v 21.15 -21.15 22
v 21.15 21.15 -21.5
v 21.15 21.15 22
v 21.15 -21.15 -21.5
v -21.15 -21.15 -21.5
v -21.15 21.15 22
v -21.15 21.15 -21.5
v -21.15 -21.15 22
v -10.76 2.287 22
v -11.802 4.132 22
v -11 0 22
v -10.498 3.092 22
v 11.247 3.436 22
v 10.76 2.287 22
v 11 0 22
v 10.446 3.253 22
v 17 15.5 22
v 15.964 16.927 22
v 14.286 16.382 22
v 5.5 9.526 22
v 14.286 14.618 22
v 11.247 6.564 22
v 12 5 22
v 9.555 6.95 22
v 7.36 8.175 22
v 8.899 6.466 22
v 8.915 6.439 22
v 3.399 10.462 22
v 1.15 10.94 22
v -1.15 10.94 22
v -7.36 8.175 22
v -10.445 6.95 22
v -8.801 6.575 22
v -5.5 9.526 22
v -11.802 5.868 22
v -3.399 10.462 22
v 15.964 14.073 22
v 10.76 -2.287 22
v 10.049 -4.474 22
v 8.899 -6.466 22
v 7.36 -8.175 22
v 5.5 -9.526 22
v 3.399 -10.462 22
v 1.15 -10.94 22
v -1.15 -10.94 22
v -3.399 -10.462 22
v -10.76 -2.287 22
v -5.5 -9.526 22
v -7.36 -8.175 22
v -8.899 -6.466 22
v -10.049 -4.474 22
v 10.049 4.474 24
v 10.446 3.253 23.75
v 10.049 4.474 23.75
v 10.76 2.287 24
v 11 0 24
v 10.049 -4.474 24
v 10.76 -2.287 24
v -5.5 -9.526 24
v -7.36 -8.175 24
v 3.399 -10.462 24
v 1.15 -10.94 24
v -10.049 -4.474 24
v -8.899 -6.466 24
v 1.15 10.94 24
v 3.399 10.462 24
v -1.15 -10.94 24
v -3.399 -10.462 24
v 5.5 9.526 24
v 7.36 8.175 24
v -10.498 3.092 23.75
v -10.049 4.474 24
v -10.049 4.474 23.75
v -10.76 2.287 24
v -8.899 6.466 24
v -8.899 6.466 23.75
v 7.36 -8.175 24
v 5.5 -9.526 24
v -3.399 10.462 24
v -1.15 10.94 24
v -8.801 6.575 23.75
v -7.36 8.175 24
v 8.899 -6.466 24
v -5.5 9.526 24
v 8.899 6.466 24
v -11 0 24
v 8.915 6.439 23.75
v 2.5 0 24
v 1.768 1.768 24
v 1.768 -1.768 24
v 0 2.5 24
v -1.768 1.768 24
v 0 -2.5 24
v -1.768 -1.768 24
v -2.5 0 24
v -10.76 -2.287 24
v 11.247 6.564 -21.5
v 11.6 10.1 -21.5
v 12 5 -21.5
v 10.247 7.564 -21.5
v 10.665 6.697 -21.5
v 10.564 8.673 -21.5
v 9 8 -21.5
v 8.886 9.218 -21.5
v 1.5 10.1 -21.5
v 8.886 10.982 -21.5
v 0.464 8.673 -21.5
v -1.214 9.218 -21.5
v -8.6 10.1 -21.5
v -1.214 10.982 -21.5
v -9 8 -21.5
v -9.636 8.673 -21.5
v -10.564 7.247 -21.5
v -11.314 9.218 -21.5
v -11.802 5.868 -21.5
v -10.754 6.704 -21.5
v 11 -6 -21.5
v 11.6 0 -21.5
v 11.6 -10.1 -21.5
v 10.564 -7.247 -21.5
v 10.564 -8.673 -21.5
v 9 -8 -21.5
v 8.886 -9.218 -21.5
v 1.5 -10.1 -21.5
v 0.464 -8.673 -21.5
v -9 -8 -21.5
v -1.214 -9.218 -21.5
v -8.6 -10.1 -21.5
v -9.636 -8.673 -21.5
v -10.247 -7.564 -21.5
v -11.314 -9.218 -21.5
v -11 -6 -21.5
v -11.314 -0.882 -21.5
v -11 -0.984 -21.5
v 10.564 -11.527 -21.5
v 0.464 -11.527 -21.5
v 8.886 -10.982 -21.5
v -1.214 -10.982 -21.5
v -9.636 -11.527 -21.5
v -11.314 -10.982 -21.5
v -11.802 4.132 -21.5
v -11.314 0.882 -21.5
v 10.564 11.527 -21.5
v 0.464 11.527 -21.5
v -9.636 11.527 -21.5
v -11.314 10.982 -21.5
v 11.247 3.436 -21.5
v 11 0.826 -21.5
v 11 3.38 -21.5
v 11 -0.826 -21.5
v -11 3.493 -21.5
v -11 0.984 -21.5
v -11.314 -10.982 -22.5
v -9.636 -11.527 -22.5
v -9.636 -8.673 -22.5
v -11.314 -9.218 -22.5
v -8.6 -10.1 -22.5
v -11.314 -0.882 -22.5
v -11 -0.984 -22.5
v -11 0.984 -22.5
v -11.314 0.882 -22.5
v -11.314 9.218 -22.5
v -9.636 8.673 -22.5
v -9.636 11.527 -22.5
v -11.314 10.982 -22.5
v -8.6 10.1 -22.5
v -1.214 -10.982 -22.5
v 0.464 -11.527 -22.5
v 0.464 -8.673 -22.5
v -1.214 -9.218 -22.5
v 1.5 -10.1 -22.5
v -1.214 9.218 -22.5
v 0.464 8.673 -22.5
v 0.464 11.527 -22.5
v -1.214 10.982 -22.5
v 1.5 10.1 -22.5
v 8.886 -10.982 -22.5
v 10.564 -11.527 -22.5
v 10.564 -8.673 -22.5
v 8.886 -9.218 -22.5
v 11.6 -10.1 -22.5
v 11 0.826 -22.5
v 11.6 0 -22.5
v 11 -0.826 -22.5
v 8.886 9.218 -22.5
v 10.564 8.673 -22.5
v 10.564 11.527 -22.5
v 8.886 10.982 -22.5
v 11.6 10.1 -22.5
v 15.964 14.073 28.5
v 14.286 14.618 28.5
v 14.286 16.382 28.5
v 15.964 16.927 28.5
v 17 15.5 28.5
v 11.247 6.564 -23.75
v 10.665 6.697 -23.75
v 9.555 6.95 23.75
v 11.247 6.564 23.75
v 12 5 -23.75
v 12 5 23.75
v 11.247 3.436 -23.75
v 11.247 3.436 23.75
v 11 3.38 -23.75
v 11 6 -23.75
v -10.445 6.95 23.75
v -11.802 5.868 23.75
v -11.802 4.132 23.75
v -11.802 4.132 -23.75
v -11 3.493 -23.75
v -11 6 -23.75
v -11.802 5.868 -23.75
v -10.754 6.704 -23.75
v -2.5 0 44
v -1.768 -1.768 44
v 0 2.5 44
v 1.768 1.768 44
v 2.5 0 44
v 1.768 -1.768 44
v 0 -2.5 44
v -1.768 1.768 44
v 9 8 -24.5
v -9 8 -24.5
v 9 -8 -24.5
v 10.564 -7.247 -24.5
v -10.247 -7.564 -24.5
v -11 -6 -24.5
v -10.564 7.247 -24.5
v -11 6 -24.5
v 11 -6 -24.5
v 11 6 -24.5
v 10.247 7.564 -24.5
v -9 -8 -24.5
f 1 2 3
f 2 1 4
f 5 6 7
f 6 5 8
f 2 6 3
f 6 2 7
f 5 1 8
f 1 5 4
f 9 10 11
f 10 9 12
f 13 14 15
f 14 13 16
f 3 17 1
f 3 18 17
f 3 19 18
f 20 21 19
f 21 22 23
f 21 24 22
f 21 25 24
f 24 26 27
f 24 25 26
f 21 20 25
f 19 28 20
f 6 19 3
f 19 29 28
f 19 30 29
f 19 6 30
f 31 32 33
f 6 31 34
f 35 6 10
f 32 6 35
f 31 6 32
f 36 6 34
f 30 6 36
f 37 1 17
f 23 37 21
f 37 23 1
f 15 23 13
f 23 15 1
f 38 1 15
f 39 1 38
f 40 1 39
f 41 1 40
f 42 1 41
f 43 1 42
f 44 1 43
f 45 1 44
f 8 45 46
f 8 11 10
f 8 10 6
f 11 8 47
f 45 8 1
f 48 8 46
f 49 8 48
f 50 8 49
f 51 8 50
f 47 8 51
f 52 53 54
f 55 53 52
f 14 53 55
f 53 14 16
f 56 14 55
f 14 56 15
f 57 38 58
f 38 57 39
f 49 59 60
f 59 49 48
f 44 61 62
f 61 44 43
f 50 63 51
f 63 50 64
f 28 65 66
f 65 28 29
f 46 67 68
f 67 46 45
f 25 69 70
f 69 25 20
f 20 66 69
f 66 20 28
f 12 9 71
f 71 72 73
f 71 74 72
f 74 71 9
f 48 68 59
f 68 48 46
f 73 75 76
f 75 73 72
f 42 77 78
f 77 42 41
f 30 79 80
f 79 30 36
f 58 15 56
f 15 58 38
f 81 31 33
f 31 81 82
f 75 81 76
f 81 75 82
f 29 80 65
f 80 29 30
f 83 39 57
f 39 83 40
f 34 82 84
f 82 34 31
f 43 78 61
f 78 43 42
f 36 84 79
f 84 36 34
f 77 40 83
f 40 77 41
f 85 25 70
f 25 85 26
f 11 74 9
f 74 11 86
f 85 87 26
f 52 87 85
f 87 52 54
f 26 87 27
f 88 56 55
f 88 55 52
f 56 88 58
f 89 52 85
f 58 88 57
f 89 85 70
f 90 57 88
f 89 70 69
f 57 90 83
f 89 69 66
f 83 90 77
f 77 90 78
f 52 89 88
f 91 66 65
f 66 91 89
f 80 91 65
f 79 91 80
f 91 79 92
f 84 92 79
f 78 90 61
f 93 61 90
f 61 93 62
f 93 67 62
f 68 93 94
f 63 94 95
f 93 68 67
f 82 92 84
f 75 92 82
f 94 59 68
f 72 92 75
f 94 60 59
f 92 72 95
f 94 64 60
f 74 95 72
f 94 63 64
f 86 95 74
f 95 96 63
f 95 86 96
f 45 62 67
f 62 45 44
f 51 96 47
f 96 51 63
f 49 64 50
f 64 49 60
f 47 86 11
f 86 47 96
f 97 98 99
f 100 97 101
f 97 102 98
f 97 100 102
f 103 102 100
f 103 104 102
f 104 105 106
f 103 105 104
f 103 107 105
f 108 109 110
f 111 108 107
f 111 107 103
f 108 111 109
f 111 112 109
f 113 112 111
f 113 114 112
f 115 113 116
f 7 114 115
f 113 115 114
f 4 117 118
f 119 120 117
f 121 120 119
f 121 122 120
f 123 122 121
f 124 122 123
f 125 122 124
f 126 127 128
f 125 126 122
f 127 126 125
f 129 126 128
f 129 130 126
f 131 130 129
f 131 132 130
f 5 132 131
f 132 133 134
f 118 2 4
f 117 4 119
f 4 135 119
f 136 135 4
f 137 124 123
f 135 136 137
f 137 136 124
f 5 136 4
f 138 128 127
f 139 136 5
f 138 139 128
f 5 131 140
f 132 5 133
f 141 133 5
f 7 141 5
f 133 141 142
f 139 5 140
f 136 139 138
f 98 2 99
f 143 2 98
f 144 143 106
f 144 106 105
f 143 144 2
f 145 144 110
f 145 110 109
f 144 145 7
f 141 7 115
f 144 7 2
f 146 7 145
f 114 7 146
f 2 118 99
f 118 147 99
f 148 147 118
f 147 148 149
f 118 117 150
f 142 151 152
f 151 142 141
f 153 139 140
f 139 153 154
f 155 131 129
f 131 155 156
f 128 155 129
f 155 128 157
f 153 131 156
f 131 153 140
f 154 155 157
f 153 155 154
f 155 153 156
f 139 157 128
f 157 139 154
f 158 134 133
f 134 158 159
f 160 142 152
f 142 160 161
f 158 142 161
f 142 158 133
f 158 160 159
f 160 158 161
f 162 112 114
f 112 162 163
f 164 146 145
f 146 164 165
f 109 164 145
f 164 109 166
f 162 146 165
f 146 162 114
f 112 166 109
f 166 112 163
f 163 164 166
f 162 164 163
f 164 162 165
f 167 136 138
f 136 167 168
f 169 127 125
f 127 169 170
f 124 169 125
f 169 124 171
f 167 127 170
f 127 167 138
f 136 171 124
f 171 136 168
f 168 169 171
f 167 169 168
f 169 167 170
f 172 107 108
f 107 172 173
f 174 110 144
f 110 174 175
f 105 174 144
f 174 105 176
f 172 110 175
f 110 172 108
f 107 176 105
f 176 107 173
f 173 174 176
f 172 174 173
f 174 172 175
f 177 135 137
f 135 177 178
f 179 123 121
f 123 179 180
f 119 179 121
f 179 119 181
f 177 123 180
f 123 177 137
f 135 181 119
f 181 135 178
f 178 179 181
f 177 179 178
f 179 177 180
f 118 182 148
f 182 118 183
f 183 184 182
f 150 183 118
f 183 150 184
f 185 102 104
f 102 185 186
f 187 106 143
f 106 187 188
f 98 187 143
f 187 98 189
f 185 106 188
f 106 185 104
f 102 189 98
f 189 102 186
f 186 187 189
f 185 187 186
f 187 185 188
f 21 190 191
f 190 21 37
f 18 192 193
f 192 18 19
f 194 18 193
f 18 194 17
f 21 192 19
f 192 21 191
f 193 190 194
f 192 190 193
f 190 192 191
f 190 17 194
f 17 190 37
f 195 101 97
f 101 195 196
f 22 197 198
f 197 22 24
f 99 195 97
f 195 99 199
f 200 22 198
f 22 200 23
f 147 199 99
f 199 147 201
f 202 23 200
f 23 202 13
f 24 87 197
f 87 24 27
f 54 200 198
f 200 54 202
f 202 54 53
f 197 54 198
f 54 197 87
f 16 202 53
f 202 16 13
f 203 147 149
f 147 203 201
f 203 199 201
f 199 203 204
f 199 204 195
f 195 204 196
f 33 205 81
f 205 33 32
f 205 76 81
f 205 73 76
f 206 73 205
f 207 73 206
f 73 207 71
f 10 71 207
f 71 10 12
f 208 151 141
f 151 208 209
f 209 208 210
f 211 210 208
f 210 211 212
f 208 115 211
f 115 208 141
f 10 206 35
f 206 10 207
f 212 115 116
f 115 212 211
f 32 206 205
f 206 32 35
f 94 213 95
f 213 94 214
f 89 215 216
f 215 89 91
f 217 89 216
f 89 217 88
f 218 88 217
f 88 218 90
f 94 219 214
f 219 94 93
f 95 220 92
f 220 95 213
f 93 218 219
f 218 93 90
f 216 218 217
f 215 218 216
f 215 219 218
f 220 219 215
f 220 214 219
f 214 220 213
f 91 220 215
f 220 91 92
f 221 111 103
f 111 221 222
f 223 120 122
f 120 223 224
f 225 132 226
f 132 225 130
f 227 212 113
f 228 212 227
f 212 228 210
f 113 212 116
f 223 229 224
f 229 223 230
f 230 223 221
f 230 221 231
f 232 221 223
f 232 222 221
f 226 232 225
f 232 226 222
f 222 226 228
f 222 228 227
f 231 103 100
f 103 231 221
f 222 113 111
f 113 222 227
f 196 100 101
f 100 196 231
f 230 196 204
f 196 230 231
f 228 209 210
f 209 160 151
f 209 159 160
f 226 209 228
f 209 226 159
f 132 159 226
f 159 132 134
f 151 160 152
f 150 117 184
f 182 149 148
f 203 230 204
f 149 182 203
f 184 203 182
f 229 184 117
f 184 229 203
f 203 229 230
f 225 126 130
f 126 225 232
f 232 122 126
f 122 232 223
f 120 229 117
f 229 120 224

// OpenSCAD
// Parameters
face_width = 42.3; //[21.15:84.6:0.1]
face_thickness = 3.0; //[1.5:6.0:0.1]
body_length = 40.0; //[20.0:80.0:0.1]
body_width = 42.3; //[21.15:84.6:0.1]
rear_cap_thickness = 2.5; //[1.0:6.0:0.1]
shaft_diameter = 5.0; //[2.5:10.0:0.1]
shaft_length = 20.0; //[10.0:40.0:0.1]
boss_diameter = 22.0; //[11.0:44.0:0.1]
boss_thickness = 2.0; //[1.0:6.0:0.1]
mount_hole_spacing = 31.0; //[15.5:62.0:0.1]
mount_hole_diameter = 3.2; //[2.0:6.0:0.1]
overlap = 1.0; //[0.5:2.0:0.1]
grill_hole_diameter = 3.0; //[1.5:6.0:0.1]
grill_margin = 6.0; //[3.0:12.0:0.1]
grill_rows = 3; //[1:6:1]
grill_cols = 3; //[1:6:1]
rail_hole_diameter = 4.0; //[2.0:8.0:0.1]
rail_hole_spacing_x = 20.0; //[10.0:40.0:0.1]
rail_hole_spacing_y = 10.0; //[5.0:30.0:0.1]
d_plug_length = 18.0; //[9.0:36.0:0.1]
d_plug_width = 12.0; //[6.0:24.0:0.1]
d_plug_rad = 2.0; //[1.0:5.0:0.1]
d_plug_thickness = 3.0; //[1.5:8.0:0.1]
screw_diameter = 3.0; //[2.0:6.0:0.1]
screw_length = 8.0; //[4.0:20.0:0.1]
washer_diameter = 7.0; //[4.0:14.0:0.1]
washer_thickness = 1.0; //[0.5:3.0:0.1]

// Modules
module grill_hole_positions() {
  color("DimGray") {
    for (i = [0:grill_cols-1]) {
      for (j = [0:grill_rows-1]) {
        translate([
          -(face_width - 2*grill_margin)/2 + (face_width - 2*grill_margin)/(grill_cols) * (i + 0.5),
          -(face_width - 2*grill_margin)/2 + (face_width - 2*grill_margin)/(grill_rows) * (j + 0.5),
          -body_length/2 - rear_cap_thickness/2 + overlap
        ])
        cylinder(r=grill_hole_diameter/2, h=rear_cap_thickness + overlap*2, center=true);
      }
    }
  }
}

module d_plug_D() {
  color("Silver") {
    translate([0, 0, -body_length/2 - rear_cap_thickness - d_plug_thickness/2 + overlap])
    linear_extrude(height=d_plug_thickness, center=true) {
      offset(r=d_plug_rad) {
        polygon(points=[
          [-d_plug_length/2, -d_plug_width/2],
          [d_plug_length/2, -d_plug_width/2],
          [d_plug_length/2, d_plug_width/2],
          [-d_plug_length/2, d_plug_width/2]
        ]);
      }
    }
  }
}

module motor_shaft() {
  color("Silver") {
    translate([0, 0, body_length/2 + face_thickness + boss_thickness + shaft_length/2 - overlap])
    cylinder(r=shaft_diameter/2, h=shaft_length, center=true);
  }
}

module screw_and_washer() {
  color("Black") {
    translate([mount_hole_spacing/2, mount_hole_spacing/2, body_length/2 + face_thickness/2 + screw_length/2 - overlap])
    cylinder(r=screw_diameter/2, h=screw_length, center=true);
    translate([mount_hole_spacing/2, mount_hole_spacing/2, body_length/2 + face_thickness/2 + washer_thickness/2 - overlap])
    cylinder(r=washer_diameter/2, h=washer_thickness, center=true);
  }
}

module rail_hole_positions() {
  color("DimGray") {
    translate([rail_hole_spacing_x/2, rail_hole_spacing_y/2, 0])
    cylinder(r=rail_hole_diameter/2, h=body_length + face_thickness + rear_cap_thickness + overlap*2, center=true);
    translate([-rail_hole_spacing_x/2, rail_hole_spacing_y/2, 0])
    cylinder(r=rail_hole_diameter/2, h=body_length + face_thickness + rear_cap_thickness + overlap*2, center=true);
  }
}

module assembly() {
  color("Black") {
    // Motor Body
    translate([0, 0, 0])
    cube([body_width, body_width, body_length], center=true);
    
    // Front Face
    translate([0, 0, body_length/2 + face_thickness/2 - overlap])
    cube([face_width, face_width, face_thickness], center=true);
    
    // Shaft Boss
    translate([0, 0, body_length/2 + face_thickness + boss_thickness/2 - overlap])
    cylinder(r=boss_diameter/2, h=boss_thickness, center=true);
    
    // Rear Cap
    translate([0, 0, -body_length/2 - rear_cap_thickness/2 + overlap])
    cube([body_width, body_width, rear_cap_thickness], center=true);
  }
  
  // Components
  motor_shaft();
  grill_hole_positions();
  d_plug_D();
  screw_and_washer();
  rail_hole_positions();
}

assembly();
